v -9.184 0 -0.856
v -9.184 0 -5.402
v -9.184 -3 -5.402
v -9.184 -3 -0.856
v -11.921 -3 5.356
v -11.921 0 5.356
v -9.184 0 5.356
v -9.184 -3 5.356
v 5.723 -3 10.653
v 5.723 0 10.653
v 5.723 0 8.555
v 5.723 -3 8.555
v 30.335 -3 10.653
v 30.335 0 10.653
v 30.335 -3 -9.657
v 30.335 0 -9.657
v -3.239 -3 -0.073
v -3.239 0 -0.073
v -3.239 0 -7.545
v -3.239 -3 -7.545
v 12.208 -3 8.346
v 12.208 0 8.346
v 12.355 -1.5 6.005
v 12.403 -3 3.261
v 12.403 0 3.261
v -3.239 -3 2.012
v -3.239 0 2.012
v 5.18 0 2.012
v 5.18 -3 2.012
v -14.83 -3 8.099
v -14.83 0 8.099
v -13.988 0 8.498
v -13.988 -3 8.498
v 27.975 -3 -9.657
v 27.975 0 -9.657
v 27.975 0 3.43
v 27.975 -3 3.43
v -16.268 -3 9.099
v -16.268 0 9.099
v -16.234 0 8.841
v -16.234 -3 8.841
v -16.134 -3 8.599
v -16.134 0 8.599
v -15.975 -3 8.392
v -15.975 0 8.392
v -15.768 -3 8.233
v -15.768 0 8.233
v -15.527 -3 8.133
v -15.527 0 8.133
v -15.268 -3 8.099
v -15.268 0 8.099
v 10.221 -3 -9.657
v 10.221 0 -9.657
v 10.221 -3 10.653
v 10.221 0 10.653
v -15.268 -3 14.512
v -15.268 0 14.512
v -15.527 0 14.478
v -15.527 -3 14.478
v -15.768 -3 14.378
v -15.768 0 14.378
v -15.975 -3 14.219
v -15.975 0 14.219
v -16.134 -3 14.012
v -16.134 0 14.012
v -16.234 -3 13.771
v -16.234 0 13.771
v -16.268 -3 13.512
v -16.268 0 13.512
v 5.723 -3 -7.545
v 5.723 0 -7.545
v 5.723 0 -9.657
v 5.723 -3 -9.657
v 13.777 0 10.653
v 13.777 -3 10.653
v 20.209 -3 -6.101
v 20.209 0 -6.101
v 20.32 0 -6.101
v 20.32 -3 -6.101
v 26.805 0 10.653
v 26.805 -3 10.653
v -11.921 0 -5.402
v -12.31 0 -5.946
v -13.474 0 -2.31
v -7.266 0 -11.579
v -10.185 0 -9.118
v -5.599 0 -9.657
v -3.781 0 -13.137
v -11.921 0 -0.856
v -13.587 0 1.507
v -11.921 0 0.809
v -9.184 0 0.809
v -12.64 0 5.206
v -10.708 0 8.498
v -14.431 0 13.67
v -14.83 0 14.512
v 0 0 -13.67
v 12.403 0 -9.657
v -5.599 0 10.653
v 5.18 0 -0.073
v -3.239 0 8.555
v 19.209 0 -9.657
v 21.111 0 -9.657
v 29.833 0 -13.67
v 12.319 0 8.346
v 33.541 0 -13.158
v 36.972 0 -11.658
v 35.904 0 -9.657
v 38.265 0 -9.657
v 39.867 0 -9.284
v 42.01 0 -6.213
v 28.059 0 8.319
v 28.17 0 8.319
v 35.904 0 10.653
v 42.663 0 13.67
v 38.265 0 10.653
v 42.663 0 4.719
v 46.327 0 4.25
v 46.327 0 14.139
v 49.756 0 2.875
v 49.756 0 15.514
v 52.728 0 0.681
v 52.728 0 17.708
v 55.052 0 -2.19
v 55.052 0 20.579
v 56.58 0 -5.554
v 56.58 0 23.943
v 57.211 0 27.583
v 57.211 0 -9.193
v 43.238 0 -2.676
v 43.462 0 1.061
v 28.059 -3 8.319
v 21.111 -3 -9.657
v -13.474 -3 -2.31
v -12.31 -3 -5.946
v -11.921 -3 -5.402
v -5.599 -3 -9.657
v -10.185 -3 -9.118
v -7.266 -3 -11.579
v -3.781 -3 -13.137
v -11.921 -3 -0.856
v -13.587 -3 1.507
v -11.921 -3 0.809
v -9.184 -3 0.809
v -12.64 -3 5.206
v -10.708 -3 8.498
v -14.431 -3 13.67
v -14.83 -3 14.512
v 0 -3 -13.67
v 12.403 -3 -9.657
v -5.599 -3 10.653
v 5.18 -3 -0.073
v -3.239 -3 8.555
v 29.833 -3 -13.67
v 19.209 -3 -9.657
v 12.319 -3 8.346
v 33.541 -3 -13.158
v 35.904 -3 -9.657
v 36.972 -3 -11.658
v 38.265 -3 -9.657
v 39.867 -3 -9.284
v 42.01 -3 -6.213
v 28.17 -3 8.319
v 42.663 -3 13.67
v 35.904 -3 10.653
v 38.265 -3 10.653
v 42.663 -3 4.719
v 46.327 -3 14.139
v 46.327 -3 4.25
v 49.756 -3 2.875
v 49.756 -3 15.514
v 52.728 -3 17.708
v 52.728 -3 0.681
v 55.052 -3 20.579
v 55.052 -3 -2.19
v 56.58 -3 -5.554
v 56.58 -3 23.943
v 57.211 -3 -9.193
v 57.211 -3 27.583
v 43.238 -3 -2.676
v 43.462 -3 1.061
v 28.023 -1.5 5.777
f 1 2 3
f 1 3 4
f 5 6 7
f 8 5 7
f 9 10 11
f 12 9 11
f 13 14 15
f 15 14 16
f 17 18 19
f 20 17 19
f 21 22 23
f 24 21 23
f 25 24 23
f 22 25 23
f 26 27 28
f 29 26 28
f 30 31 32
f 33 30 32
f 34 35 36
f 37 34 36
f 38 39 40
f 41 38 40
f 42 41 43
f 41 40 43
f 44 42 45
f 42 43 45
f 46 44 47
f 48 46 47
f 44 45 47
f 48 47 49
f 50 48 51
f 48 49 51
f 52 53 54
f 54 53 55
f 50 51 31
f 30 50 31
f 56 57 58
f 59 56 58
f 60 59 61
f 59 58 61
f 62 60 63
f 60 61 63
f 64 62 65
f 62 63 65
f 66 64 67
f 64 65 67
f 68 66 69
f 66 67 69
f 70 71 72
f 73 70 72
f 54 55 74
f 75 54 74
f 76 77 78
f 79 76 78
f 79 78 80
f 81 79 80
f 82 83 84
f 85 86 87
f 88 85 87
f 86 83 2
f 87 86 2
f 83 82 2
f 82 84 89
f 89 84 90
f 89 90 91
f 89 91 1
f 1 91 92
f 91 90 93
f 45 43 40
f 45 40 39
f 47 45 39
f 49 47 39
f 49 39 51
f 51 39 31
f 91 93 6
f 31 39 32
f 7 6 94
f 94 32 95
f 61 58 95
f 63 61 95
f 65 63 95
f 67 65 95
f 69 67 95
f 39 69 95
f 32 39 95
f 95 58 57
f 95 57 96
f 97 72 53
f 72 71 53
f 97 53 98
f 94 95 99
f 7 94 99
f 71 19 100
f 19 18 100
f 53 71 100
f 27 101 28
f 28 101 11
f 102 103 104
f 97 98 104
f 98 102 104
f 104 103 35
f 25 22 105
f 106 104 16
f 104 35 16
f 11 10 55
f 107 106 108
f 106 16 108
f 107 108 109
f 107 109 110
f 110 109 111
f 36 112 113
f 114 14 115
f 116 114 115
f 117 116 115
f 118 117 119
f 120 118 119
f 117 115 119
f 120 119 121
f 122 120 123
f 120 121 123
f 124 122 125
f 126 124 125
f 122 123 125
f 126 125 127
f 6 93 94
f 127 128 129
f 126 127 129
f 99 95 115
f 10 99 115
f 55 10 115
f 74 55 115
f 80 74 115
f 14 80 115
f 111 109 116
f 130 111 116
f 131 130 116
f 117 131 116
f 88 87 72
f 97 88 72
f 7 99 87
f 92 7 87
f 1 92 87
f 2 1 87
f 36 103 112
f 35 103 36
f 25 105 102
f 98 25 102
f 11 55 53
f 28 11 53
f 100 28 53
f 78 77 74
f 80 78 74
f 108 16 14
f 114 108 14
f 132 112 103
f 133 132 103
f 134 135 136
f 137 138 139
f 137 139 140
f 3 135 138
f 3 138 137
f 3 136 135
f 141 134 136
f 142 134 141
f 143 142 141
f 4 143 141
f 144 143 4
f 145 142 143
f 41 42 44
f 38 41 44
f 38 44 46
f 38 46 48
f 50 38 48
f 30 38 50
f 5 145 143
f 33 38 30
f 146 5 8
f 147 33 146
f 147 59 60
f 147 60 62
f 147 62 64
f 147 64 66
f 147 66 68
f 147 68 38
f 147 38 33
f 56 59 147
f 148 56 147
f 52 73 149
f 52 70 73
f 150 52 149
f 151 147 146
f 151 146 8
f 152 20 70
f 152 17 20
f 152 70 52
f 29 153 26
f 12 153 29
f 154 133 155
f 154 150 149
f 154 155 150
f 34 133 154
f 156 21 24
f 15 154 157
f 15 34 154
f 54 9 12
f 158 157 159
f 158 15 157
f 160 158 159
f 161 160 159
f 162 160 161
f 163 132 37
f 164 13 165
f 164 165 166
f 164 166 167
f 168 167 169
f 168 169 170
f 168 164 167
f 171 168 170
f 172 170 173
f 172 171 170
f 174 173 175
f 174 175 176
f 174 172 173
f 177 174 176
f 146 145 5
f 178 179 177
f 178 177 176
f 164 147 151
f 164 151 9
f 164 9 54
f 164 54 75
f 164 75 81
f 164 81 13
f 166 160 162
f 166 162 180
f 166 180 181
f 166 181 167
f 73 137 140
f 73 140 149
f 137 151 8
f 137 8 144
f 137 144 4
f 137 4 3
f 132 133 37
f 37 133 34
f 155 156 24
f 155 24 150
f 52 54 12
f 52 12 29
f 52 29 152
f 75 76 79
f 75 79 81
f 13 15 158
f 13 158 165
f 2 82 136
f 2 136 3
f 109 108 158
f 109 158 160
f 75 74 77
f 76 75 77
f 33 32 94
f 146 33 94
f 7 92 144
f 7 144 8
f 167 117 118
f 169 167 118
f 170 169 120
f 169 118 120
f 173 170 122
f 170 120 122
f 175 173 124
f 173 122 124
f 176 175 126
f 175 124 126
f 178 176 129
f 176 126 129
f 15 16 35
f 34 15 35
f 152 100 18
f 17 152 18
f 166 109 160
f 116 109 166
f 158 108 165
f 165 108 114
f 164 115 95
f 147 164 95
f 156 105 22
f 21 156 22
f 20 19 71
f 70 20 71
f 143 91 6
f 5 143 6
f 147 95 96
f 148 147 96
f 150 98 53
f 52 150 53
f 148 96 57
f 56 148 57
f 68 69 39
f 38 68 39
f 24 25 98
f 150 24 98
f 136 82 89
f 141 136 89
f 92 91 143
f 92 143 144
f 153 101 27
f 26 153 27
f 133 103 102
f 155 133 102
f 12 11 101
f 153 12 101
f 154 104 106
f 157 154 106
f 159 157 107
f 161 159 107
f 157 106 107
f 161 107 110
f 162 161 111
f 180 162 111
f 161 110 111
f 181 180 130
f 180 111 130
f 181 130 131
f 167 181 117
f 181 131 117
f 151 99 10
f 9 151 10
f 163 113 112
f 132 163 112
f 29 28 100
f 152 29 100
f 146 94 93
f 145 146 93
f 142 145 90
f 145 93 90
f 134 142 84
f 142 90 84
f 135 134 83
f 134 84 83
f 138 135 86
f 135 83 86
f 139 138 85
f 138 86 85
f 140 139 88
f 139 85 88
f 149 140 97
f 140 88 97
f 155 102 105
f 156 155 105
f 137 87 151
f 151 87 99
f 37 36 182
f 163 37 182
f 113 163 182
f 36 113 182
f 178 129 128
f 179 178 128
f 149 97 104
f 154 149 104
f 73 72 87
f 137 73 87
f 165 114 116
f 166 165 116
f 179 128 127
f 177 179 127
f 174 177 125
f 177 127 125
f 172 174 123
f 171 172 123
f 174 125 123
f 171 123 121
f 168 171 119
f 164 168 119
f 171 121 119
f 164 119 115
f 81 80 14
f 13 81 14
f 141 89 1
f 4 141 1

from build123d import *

# Parameters (mm, degrees)
F0_W     = 2.7374038473
F0_H     = 4.5464726281
F0_W_2   = 2.3603244432
F0_H_2   = 20.3094583448
F1_DEPTH = 3


with BuildPart() as f1:
    # F0 (on Front) → F1 (new body)
    with BuildSketch(Plane.XZ):
        with BuildLine():
            Line((-13.9879264009, 8.4983842463), (-10.7078288449, 8.4983842463))
            ThreePointArc((-10.7078288449, 8.4983842463), (-12.3096819162, -5.9457433928), (0, -13.6704108706))
            Line((0, -13.6704108706), (29.832560569, -13.6704108706))
            ThreePointArc((29.832560569, -13.6704108706), (41.0439649972, -7.8220549805), (42.6626390029, 4.7190275219))
            ThreePointArc((42.6626390029, 4.7190275219), (52.7277631814, 0.6811115523), (57.2114773095, -9.193492122))
            Line((57.2114773095, -9.193492122), (57.2114773095, 27.5829305145))
            ThreePointArc((57.2114773095, 27.5829305145), (52.7277631814, 17.7083268402), (42.6626390029, 13.6704108706))
            Line((42.6626390029, 13.6704108706), (29.832560569, 13.6704108706))
            Line((29.832560569, 13.6704108706), (0, 13.6704108706))
            Line((0, 13.6704108706), (-14.4307379611, 13.6704108706))
            Line((-14.4307379611, 13.6704108706), (-14.8297163701, 14.5122008398))
            Line((-14.8297163701, 14.5122008398), (-15.268201828, 14.5122008398))
            ThreePointArc((-15.268201828, 14.5122008398), (-15.9753086092, 14.219307621), (-16.268201828, 13.5122008398))
            Line((-16.268201828, 13.5122008398), (-16.268201828, 9.0994058373))
            ThreePointArc((-16.268201828, 9.0994058373), (-15.9753086092, 8.3922990562), (-15.268201828, 8.0994058373))
            Line((-15.268201828, 8.0994058373), (-14.8297163701, 8.0994058373))
            Line((-14.8297163701, 8.0994058373), (-13.9879264009, 8.4983842463))
        make_face()
        with Locations((-10.5523099191, -3.12910098)):
            Rectangle(F0_W, F0_H, mode=Mode.SUBTRACT)
        Polygon((5.7225638777, -7.545285929), (5.7225638777, -9.6566872671), (-5.59899235, -9.6566872671), (-5.59899235, 10.6527710777), (5.7225638777, 10.6527710777), (5.7225638777, 8.5547049059), (-3.2386679067, 8.5547049059), (-3.2386679067, 2.0115832855), (5.180267113, 2.0115832855), (5.180267113, -0.0731477199), (-3.2386679067, -0.0731477199), (-3.2386679067, -7.545285929), align=None, mode=Mode.SUBTRACT)
        with Locations((-10.5523099191, 3.0826488801)):
            Rectangle(F0_W, F0_H, mode=Mode.SUBTRACT)
        with BuildLine():
            Line((21.1113458408, -9.6566872671), (19.2088621088, -9.6566872671))
            Line((19.2088621088, -9.6566872671), (12.3190261635, 8.3457872998))
            Line((12.3190261635, 8.3457872998), (12.2078997772, 8.3457872998))
            add(Edge.make_bspline(
                [(12.2078997772, 8.3457872998), (12.403482217, 6.207715629), (12.403482217, 3.2606438666)],
                knots=[0, 0, 0, 1, 1, 1], degree=2))
            Line((12.403482217, 3.2606438666), (12.403482217, -9.6566872671))
            Line((12.403482217, -9.6566872671), (10.2209599917, -9.6566872671))
            Line((10.2209599917, -9.6566872671), (10.2209599917, 10.6527710777))
            Line((10.2209599917, 10.6527710777), (13.7770043506, 10.6527710777))
            Line((13.7770043506, 10.6527710777), (20.2089995848, -6.1006429082))
            Line((20.2089995848, -6.1006429082), (20.320125971, -6.1006429082))
            Line((20.320125971, -6.1006429082), (26.8054618705, 10.6527710777))
            Line((26.8054618705, 10.6527710777), (30.3348358968, 10.6527710777))
            Line((30.3348358968, 10.6527710777), (30.3348358968, -9.6566872671))
            Line((30.3348358968, -9.6566872671), (27.9745114535, -9.6566872671))
            Line((27.9745114535, -9.6566872671), (27.9745114535, 3.4295559736))
            add(Edge.make_bspline(
                [(27.9745114535, 3.4295559736), (27.9745114535, 5.6787540306), (28.1700938933, 8.3191169671)],
                knots=[0, 0, 0, 1, 1, 1], degree=2))
            Line((28.1700938933, 8.3191169671), (28.0589675071, 8.3191169671))
            Line((28.0589675071, 8.3191169671), (21.1113458408, -9.6566872671))
        make_face(mode=Mode.SUBTRACT)
        with Locations((37.0846525955, 0.4980419053)):
            Rectangle(F0_W_2, F0_H_2, mode=Mode.SUBTRACT)
    extrude(amount=F1_DEPTH)


solid = f1.part
